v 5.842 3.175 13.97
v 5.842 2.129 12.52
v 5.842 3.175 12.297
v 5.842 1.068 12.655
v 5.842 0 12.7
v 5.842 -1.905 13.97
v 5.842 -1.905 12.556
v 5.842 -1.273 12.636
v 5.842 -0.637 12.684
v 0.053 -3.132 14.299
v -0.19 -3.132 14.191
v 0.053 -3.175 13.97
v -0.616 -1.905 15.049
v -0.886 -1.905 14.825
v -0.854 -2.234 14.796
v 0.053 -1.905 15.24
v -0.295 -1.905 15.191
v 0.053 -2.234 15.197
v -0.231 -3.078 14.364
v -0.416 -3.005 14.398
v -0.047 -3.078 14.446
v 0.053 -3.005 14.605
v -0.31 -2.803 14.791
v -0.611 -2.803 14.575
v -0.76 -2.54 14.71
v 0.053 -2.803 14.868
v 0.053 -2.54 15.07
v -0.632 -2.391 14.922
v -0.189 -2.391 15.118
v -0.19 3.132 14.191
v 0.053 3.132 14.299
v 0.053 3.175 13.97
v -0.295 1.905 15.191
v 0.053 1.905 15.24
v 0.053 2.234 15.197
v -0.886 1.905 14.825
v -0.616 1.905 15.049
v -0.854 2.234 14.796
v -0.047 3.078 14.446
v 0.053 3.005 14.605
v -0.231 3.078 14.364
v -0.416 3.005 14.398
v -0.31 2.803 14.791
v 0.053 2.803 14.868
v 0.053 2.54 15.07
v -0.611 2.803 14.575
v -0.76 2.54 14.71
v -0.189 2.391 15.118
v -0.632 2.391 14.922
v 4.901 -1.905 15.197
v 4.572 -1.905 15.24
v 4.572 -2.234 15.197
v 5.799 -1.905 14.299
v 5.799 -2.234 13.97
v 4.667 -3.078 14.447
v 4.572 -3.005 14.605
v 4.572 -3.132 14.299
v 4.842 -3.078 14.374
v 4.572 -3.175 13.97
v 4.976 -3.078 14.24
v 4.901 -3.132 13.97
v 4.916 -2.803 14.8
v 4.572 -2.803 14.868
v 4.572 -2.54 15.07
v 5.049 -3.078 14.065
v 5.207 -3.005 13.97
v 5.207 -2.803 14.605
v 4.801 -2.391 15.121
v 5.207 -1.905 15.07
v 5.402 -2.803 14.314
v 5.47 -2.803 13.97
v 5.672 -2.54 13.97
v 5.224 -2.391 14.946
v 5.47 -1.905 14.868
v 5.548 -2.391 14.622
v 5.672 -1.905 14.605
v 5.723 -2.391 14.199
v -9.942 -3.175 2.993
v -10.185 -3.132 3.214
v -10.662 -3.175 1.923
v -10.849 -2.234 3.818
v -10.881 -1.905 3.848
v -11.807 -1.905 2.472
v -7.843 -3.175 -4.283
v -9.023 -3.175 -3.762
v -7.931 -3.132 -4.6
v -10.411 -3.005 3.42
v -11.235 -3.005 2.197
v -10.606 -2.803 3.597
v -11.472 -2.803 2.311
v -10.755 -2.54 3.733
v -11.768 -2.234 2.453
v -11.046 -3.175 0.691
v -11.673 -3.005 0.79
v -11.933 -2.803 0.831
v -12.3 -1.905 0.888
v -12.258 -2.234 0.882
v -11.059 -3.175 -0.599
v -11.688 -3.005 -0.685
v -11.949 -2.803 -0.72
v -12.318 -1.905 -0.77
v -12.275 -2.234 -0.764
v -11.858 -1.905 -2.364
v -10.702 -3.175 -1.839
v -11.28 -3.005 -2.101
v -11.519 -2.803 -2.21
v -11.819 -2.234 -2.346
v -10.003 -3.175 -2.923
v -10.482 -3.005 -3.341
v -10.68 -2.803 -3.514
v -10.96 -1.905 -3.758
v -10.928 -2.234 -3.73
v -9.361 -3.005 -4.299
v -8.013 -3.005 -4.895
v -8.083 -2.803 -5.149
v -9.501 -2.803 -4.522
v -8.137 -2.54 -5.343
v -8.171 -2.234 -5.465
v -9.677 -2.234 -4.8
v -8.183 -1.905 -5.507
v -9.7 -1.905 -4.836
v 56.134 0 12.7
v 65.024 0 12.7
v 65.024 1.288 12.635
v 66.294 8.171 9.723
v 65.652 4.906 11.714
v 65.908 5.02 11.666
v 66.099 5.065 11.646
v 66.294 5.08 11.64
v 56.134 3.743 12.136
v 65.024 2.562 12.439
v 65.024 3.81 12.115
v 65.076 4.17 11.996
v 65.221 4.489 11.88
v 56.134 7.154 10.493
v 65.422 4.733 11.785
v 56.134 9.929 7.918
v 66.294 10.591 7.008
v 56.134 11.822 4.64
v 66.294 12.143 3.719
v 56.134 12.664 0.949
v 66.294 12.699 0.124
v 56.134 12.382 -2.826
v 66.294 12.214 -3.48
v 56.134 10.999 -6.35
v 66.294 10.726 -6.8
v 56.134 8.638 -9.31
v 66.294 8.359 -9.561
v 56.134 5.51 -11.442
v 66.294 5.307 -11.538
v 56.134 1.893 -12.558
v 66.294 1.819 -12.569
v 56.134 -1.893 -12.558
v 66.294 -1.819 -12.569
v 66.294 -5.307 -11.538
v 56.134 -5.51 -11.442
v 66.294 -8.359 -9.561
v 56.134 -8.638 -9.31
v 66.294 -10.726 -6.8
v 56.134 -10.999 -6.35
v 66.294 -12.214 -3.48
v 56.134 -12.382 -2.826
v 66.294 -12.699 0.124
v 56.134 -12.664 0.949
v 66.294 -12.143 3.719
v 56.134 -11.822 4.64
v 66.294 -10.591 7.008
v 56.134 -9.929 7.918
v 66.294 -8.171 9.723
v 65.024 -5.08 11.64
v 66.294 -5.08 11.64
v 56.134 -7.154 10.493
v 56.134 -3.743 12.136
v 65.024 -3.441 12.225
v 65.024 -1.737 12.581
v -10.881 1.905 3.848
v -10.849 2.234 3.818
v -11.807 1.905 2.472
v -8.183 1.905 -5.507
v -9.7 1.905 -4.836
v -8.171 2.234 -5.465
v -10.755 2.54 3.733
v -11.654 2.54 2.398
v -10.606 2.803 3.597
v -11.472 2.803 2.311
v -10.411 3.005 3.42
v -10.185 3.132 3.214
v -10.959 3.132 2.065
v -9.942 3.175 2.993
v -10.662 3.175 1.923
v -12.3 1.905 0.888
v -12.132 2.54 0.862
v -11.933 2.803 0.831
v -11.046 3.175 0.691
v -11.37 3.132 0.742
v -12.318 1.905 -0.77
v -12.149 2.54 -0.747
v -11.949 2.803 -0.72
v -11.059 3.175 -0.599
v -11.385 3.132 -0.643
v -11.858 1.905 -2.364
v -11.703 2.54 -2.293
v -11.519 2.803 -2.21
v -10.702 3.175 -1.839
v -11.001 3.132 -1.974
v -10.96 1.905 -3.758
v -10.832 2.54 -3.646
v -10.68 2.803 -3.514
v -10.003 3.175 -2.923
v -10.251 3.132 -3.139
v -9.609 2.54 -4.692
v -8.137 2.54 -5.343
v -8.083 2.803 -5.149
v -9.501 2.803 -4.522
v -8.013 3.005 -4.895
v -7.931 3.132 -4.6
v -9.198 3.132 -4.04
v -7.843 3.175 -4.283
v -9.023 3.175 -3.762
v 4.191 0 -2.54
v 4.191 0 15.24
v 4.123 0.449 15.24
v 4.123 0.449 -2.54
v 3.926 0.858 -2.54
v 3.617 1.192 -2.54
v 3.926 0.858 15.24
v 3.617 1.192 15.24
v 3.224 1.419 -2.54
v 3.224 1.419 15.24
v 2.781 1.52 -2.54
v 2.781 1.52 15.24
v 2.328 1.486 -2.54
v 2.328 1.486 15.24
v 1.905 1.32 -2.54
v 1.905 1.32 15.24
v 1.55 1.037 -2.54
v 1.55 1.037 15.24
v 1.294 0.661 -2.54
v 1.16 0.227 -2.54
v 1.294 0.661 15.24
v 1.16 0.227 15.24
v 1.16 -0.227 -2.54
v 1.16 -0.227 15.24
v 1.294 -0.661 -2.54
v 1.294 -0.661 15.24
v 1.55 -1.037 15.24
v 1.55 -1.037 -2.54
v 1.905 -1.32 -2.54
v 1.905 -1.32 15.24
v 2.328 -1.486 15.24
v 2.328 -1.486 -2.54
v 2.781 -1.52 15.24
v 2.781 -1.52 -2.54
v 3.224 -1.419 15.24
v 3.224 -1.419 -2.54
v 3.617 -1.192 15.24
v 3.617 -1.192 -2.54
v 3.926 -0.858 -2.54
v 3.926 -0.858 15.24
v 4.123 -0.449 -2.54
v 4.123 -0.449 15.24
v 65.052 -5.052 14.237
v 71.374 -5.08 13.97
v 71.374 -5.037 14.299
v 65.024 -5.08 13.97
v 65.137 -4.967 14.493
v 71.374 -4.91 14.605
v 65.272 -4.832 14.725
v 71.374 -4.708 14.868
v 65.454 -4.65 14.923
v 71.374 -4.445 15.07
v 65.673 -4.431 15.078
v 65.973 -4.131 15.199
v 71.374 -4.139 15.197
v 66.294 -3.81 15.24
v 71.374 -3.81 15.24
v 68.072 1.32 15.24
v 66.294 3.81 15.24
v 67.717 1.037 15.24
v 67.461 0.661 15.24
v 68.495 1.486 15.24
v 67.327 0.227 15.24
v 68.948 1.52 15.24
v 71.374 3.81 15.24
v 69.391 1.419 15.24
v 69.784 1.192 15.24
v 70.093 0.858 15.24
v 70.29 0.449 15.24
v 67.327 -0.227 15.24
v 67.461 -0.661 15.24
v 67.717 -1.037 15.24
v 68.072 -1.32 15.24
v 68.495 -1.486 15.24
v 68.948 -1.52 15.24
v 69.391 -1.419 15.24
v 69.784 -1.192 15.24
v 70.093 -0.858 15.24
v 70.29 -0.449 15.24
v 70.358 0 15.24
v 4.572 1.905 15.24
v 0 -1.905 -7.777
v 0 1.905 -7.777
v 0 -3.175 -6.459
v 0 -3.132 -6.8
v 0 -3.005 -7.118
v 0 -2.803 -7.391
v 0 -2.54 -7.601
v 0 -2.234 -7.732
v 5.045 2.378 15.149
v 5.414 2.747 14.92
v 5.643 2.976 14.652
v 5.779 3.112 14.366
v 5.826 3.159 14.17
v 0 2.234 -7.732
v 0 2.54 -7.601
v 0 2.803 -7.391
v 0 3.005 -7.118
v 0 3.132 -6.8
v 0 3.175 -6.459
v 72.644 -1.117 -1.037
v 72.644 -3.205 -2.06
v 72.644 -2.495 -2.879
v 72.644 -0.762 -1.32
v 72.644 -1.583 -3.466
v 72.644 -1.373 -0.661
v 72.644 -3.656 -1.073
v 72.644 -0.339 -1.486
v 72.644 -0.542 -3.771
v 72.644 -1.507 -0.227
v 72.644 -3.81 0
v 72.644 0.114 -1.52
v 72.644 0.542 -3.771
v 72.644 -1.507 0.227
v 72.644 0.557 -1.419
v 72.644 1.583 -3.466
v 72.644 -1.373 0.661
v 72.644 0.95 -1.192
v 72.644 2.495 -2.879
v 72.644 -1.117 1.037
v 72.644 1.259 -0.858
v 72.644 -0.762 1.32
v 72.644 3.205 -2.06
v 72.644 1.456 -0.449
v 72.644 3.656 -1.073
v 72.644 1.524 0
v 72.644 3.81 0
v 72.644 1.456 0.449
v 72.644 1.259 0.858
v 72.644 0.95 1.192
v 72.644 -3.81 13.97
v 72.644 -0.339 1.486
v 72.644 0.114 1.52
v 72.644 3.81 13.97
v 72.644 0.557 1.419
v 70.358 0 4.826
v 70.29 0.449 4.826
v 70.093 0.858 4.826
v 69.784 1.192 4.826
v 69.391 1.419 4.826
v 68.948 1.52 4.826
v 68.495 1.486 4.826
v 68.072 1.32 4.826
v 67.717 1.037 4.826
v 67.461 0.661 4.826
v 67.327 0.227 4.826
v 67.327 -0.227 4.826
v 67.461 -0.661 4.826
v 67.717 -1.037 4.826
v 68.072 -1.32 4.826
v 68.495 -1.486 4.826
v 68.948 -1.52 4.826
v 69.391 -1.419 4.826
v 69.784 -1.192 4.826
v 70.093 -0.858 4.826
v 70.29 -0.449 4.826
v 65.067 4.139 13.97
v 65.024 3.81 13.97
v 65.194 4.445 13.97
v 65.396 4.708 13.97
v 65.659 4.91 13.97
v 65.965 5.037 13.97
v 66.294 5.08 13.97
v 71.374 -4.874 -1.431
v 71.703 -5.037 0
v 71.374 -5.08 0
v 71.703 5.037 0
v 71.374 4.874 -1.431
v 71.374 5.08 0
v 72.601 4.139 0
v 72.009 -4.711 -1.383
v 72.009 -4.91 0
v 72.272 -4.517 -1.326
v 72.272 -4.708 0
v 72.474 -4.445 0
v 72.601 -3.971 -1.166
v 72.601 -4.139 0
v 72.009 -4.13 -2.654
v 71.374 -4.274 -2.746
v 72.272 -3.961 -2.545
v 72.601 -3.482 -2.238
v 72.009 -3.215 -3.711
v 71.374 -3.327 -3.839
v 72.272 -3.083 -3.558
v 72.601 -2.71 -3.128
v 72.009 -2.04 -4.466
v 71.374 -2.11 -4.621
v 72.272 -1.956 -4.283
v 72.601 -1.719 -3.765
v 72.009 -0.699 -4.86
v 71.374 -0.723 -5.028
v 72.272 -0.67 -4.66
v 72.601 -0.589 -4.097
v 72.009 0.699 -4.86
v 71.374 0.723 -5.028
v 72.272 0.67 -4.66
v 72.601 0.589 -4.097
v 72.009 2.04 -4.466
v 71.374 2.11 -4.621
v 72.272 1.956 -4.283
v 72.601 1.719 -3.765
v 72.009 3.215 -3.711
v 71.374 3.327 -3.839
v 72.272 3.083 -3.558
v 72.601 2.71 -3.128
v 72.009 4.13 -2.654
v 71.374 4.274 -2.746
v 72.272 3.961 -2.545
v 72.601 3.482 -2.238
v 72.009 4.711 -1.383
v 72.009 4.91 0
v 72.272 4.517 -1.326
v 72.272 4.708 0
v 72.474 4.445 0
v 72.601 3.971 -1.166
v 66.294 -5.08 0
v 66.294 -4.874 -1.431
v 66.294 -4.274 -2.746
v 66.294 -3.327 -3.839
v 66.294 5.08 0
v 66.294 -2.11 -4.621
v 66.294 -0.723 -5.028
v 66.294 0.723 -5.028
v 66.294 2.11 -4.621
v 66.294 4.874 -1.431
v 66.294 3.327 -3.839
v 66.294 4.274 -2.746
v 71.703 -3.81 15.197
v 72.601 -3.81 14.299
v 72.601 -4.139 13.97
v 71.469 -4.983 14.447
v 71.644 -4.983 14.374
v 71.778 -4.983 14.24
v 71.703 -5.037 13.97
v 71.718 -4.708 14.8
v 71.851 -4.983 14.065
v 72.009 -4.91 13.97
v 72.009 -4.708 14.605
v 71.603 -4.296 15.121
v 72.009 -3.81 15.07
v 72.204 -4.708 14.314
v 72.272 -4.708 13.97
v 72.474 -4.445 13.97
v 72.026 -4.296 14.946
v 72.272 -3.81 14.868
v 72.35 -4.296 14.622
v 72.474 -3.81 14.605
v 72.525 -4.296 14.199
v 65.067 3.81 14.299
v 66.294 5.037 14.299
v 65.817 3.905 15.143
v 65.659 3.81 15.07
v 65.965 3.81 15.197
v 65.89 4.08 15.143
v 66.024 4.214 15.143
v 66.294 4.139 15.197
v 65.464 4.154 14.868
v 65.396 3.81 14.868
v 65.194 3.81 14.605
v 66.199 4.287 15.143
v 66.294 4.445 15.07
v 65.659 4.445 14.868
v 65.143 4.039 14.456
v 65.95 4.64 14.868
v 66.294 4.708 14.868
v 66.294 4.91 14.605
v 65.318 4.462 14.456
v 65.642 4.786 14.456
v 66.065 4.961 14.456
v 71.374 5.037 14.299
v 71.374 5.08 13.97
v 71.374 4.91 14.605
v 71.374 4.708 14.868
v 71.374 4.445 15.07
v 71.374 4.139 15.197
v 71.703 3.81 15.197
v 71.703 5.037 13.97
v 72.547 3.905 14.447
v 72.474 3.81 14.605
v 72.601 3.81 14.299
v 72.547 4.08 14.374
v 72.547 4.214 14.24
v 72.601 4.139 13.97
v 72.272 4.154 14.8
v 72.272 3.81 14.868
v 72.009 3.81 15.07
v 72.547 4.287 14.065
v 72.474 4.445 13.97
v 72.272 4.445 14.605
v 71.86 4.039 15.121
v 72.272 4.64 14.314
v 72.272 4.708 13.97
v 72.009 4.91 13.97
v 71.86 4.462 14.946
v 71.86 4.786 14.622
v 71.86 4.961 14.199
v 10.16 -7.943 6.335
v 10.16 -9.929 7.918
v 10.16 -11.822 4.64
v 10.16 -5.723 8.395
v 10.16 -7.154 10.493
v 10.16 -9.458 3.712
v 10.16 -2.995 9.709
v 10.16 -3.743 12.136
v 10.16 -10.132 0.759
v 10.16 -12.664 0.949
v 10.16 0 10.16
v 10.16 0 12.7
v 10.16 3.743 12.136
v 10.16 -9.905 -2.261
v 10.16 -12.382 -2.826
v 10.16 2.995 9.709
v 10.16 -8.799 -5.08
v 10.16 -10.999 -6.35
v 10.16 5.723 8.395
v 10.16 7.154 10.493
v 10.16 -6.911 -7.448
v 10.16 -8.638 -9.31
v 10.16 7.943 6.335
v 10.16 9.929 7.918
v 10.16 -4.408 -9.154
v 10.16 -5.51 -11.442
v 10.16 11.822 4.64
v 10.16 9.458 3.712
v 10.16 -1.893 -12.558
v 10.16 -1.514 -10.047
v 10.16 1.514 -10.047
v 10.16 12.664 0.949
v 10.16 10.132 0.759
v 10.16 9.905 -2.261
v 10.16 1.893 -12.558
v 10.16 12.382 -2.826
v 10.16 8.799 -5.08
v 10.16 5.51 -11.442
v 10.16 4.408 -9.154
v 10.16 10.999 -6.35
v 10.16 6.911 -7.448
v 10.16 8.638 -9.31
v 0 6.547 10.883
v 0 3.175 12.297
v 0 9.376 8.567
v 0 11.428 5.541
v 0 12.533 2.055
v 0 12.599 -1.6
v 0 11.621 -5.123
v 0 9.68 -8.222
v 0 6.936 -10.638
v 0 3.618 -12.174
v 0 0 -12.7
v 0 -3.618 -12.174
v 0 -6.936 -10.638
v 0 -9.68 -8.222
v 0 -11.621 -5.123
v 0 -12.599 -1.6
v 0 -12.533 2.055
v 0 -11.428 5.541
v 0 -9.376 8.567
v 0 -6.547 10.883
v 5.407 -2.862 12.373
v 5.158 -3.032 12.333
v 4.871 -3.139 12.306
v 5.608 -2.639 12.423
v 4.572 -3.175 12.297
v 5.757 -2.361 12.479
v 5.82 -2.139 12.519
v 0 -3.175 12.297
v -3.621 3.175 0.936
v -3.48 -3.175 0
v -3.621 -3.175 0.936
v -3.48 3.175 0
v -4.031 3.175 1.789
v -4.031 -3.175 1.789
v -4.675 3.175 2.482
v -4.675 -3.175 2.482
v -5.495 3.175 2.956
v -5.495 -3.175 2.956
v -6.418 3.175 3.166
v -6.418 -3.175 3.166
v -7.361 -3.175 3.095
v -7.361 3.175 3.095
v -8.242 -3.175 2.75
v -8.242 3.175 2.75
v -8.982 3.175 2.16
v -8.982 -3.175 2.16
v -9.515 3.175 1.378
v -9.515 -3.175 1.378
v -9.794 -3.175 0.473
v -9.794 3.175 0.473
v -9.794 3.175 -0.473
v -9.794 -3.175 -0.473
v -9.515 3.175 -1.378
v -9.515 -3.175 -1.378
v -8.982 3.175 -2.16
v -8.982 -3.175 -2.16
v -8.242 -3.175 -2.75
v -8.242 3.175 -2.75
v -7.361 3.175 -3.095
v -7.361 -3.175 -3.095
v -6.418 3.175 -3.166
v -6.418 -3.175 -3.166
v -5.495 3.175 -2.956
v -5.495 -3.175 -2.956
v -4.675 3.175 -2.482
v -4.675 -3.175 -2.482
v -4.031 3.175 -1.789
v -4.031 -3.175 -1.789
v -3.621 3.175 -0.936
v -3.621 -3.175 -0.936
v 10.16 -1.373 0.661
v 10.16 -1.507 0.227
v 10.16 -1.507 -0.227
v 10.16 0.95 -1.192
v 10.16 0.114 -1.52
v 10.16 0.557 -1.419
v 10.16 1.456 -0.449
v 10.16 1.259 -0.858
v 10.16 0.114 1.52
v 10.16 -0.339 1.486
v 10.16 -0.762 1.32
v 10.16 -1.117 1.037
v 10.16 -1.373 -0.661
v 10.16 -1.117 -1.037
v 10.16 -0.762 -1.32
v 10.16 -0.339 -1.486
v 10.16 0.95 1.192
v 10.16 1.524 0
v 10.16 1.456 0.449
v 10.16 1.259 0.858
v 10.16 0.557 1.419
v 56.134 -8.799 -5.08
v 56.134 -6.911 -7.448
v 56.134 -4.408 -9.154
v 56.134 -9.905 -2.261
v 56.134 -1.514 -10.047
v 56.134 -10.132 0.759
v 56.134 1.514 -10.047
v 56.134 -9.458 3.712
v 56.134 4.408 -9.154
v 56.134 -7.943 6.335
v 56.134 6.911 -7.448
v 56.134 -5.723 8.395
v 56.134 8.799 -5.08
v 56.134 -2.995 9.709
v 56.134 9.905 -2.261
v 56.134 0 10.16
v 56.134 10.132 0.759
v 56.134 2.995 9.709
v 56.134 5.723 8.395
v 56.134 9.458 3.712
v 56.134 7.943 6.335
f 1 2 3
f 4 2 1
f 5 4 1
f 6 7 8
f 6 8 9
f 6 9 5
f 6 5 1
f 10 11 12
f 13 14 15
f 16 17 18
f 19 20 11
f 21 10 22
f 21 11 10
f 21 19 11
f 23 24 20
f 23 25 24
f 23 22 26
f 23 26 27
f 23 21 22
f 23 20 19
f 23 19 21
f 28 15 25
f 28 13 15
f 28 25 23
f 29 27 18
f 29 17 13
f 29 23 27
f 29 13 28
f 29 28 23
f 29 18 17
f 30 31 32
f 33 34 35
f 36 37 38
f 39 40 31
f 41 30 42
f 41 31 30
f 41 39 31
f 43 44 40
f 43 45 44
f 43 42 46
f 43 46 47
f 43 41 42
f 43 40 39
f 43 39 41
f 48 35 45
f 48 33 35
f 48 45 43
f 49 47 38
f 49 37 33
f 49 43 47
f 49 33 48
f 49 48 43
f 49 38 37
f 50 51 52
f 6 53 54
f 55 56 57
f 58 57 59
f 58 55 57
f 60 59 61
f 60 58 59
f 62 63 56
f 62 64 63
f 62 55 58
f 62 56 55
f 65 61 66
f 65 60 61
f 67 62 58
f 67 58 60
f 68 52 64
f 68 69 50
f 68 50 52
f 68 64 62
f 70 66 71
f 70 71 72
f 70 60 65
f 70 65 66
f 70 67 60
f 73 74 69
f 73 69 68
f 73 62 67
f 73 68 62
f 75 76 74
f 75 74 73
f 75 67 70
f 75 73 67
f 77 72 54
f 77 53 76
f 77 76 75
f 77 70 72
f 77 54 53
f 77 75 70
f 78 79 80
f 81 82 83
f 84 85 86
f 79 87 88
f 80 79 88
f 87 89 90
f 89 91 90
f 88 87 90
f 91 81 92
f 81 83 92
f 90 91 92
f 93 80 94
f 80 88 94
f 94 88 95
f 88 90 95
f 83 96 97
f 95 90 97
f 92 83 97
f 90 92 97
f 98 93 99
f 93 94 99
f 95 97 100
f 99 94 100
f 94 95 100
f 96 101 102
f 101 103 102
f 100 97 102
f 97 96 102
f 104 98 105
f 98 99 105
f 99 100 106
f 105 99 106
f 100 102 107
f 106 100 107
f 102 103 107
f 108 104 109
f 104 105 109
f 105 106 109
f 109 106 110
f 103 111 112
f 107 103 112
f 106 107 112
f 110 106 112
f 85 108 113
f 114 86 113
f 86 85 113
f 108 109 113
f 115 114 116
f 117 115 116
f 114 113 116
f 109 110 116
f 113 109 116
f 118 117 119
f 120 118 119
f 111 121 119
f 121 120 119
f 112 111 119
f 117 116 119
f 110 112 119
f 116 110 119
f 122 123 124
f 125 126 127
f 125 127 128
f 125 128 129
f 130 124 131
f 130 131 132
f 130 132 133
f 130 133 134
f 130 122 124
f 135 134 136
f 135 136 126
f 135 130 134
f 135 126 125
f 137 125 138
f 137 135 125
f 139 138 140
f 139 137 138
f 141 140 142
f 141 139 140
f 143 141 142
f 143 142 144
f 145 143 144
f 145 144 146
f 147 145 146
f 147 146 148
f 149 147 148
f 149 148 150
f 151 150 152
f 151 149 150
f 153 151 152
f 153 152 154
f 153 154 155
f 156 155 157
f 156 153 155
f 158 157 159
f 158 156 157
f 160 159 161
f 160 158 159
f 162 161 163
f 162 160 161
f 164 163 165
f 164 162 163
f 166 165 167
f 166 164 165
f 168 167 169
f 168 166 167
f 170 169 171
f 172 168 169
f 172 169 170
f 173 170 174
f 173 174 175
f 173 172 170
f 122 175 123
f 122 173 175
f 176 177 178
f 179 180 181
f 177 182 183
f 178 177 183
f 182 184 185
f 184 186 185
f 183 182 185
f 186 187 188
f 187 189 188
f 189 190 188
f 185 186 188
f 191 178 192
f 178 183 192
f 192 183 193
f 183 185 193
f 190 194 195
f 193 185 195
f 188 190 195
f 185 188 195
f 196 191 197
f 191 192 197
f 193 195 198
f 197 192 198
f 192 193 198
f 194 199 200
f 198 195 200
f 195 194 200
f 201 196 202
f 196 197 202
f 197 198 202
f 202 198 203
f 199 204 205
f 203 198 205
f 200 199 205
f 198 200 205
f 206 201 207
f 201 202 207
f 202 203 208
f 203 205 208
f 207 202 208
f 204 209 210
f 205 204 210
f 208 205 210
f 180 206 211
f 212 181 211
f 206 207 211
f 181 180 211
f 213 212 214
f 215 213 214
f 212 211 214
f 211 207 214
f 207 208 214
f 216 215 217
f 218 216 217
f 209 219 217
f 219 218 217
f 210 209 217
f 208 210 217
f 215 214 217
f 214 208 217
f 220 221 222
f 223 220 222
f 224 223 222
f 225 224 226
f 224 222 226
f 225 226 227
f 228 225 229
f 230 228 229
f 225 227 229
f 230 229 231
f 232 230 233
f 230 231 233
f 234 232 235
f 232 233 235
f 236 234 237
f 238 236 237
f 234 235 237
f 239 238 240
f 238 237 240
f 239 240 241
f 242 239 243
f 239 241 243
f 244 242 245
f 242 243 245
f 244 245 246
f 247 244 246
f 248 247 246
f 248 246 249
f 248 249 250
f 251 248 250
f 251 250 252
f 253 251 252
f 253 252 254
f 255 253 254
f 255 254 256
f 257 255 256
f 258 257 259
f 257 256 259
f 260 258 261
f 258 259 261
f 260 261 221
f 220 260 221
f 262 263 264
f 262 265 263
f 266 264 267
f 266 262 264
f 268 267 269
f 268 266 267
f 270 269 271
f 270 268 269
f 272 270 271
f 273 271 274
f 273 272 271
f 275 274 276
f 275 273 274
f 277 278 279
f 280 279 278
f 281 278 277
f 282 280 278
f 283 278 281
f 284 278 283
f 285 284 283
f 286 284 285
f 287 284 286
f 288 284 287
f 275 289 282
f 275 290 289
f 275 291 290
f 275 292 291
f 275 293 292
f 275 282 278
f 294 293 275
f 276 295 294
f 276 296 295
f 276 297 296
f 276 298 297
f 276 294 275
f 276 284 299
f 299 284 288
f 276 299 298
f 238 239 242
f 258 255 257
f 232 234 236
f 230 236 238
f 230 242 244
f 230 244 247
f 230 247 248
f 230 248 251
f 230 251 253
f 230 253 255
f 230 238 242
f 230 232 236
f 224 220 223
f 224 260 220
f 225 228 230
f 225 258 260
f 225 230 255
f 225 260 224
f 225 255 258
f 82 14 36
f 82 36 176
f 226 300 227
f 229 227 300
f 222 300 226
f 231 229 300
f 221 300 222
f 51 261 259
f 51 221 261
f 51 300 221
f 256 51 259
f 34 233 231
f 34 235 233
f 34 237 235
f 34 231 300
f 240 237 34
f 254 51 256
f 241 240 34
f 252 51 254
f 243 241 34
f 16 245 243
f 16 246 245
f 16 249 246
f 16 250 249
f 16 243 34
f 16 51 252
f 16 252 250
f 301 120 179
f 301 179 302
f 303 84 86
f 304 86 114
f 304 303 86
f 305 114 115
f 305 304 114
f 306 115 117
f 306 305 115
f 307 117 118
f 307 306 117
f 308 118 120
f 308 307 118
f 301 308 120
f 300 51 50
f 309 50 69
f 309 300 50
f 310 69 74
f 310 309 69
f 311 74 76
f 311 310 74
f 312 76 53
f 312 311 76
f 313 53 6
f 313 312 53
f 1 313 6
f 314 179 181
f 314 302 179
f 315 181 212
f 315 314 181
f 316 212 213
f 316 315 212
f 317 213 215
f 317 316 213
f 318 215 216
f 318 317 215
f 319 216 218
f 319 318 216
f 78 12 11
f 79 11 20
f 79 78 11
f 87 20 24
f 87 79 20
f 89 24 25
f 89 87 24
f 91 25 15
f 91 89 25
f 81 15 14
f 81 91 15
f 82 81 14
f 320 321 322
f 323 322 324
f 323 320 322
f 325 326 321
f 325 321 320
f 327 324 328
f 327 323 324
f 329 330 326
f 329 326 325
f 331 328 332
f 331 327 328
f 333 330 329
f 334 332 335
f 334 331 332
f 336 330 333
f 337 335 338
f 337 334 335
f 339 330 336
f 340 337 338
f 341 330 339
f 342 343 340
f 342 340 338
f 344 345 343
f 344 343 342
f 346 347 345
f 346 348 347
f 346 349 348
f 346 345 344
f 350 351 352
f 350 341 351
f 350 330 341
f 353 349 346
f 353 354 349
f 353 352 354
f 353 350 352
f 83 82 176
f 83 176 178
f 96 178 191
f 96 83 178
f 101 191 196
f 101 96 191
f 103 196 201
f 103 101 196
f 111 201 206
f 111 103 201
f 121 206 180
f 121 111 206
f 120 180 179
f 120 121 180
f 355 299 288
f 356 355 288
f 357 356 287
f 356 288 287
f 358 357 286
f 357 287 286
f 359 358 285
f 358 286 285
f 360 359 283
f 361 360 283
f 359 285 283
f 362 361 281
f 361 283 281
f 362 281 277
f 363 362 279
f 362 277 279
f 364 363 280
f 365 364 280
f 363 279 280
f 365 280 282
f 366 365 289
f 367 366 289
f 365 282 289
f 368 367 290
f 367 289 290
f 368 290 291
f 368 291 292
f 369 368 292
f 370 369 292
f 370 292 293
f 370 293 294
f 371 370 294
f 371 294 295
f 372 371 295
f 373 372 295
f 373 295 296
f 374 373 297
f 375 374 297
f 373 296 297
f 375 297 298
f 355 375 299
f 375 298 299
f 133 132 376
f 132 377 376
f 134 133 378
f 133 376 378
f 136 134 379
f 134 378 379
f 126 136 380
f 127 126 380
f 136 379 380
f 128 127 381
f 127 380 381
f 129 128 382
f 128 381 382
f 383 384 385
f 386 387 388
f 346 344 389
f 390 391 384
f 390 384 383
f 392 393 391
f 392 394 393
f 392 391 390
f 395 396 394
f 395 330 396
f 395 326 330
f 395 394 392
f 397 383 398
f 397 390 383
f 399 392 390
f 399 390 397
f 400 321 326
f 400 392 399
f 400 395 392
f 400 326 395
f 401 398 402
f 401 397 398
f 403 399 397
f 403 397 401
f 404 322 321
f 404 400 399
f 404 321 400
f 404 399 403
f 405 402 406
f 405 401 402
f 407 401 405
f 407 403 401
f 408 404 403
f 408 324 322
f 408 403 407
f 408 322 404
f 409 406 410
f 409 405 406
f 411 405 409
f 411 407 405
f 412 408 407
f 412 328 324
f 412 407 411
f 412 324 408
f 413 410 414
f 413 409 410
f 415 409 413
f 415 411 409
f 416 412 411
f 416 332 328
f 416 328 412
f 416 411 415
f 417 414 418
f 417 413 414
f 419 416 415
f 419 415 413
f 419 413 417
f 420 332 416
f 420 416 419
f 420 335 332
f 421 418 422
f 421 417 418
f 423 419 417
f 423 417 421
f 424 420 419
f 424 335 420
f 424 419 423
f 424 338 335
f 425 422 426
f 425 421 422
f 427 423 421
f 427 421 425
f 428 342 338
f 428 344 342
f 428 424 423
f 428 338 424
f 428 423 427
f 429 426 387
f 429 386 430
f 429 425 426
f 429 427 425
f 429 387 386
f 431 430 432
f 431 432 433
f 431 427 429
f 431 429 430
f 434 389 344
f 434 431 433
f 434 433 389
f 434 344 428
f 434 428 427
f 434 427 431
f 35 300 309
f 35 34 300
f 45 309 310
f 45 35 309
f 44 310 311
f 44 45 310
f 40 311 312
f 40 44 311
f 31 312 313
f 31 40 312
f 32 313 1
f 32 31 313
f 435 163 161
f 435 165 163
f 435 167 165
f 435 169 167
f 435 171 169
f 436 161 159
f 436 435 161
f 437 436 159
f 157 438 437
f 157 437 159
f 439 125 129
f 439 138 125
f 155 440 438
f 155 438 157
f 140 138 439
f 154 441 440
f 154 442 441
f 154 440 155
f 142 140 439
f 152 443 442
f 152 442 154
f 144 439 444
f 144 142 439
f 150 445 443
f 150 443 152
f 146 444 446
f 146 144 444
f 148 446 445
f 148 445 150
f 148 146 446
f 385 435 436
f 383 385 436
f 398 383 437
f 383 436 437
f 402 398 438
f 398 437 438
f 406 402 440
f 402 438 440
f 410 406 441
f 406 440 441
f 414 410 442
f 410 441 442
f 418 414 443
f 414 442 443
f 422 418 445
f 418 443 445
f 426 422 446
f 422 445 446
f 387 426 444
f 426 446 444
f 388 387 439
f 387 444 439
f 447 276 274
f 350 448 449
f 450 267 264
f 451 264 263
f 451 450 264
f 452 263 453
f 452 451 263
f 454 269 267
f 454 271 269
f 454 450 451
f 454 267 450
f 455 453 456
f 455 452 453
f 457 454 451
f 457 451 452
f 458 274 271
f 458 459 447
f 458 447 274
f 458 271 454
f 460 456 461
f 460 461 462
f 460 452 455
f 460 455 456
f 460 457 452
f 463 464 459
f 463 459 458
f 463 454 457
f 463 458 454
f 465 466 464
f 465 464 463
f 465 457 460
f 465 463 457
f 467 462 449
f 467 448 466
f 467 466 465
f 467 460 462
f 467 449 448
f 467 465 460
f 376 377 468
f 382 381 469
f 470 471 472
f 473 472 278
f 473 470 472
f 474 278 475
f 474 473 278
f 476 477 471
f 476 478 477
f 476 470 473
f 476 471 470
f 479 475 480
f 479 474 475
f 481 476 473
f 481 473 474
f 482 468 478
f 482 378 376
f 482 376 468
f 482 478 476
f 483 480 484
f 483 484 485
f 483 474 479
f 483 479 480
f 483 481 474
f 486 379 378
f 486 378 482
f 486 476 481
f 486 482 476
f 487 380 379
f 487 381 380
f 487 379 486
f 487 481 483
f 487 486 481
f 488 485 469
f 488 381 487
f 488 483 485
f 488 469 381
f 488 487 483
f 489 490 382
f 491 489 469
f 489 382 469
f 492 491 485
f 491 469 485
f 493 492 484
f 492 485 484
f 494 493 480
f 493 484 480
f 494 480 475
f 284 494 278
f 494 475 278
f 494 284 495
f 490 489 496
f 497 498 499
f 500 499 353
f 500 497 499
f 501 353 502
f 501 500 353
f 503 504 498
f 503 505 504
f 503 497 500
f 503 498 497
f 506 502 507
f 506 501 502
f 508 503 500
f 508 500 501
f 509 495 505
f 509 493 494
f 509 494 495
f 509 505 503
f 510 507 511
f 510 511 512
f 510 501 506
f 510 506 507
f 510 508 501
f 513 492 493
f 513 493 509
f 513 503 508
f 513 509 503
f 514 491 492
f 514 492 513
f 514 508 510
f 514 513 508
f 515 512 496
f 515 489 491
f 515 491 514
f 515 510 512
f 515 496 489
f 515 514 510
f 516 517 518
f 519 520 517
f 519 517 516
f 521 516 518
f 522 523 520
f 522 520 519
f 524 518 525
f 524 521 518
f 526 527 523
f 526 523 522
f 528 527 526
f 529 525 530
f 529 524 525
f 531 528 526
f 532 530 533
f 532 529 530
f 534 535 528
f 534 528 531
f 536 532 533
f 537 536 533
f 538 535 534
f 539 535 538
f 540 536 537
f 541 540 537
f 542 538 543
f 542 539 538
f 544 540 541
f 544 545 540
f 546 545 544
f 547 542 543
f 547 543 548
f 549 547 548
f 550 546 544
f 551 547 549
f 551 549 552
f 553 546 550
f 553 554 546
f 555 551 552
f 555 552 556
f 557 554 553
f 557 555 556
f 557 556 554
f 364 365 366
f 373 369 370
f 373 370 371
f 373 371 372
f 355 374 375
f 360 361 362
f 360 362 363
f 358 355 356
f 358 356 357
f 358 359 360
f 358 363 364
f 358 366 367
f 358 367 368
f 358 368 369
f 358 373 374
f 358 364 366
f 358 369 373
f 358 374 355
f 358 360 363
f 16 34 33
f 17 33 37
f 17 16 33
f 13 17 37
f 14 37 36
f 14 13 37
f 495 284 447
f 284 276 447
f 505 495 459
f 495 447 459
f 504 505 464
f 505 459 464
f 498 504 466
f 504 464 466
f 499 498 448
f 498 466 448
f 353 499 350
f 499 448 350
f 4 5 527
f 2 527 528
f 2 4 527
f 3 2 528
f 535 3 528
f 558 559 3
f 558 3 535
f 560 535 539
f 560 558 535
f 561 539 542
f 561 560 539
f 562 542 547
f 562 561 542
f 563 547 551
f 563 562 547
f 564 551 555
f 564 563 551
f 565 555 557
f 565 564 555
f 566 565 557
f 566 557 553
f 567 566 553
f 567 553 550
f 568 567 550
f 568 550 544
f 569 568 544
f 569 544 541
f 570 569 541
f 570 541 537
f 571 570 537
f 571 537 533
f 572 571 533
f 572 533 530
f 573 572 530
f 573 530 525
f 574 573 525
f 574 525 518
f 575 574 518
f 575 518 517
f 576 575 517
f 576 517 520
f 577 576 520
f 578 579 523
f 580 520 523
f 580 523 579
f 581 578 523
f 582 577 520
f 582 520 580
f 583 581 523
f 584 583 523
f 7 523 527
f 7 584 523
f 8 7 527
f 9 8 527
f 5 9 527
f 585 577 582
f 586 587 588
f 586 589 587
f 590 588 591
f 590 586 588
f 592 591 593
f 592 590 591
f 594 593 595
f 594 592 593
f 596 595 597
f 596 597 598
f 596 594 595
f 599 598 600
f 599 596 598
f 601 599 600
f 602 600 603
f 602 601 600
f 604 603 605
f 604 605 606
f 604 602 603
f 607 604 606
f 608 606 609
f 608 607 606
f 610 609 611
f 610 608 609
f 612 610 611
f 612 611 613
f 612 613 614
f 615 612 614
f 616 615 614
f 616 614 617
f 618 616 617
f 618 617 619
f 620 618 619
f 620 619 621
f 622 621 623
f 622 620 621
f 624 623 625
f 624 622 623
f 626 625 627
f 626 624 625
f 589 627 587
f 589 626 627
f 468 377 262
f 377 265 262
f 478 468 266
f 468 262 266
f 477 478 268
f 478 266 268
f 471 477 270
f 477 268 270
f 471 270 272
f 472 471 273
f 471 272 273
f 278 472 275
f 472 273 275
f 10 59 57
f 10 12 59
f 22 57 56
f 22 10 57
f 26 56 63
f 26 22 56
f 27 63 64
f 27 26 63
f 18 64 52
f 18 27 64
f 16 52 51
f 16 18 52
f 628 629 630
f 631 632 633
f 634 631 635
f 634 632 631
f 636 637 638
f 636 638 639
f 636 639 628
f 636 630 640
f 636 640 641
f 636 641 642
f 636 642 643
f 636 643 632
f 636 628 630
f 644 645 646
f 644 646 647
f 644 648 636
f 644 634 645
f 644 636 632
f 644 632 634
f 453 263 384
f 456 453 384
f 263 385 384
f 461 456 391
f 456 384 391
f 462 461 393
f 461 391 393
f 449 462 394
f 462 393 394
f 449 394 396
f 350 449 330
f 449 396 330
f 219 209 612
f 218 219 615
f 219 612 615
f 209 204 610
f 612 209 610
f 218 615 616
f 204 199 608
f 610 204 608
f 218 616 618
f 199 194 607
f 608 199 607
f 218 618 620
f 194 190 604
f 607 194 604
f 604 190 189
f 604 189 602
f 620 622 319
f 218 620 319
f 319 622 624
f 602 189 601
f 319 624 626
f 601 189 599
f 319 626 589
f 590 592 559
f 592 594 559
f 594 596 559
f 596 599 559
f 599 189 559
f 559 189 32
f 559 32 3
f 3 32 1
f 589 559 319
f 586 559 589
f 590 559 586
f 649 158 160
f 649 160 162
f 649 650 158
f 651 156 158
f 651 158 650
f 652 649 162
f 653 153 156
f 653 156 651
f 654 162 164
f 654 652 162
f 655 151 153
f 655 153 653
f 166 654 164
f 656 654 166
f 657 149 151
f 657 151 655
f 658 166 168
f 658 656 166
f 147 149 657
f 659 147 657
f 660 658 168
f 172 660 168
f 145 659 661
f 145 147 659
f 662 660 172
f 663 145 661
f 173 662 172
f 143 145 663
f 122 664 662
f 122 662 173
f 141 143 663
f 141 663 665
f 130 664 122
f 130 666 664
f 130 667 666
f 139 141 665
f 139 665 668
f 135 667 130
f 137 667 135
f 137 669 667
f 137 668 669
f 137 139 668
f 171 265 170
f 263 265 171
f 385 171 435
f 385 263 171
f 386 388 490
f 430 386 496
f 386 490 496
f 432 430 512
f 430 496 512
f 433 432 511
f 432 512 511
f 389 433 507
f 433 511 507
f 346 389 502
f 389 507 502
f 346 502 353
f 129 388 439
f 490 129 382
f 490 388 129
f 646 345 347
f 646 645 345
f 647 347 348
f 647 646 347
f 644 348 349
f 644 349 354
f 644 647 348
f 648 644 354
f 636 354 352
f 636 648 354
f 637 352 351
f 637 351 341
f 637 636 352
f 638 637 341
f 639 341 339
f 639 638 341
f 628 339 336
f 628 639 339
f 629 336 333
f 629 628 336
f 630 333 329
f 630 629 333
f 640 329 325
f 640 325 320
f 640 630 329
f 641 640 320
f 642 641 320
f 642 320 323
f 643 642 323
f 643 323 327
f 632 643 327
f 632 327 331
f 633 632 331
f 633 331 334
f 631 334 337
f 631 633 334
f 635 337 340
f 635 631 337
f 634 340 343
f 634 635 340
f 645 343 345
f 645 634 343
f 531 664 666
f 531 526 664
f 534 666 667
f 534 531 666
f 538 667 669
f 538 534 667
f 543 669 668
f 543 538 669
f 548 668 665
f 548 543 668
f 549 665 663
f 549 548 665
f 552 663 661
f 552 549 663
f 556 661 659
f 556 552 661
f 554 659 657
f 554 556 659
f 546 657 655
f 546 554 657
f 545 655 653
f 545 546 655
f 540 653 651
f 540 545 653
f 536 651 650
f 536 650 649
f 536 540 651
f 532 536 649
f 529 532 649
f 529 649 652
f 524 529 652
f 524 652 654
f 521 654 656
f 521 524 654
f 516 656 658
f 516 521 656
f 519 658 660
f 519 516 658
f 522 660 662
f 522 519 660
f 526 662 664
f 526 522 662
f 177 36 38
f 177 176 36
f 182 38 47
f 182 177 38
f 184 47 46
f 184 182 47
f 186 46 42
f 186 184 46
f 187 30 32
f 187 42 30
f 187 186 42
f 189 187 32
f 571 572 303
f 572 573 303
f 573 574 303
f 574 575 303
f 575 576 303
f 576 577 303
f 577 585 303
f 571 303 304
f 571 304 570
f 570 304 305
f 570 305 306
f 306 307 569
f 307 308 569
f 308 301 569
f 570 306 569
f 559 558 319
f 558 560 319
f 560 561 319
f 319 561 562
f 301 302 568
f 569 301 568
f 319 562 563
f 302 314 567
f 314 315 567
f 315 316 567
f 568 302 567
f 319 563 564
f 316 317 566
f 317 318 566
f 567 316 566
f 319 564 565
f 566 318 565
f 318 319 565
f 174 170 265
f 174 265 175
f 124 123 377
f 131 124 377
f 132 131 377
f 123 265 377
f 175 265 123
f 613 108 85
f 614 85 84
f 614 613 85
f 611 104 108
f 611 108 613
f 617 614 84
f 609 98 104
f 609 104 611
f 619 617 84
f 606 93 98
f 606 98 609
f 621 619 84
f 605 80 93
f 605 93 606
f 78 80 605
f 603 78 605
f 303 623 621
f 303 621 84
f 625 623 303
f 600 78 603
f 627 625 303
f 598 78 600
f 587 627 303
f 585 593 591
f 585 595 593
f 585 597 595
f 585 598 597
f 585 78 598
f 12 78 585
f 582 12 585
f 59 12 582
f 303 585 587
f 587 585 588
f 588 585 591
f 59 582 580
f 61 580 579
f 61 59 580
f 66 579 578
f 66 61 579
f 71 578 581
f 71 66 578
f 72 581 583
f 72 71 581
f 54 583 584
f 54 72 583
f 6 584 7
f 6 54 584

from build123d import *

# Parameters (mm, degrees)
F0_W          = 5.842
F0_H          = 12.7
F0_R          = 3.175
F2_DEPTH      = 3.175
F3_R          = 1.524
F4_DEPTH      = 6.35
F4_DEPTH_BACK = 1.27
F6_R          = 1.524
F7_DEPTH      = 17.78
F5_R          = 1.524
F8_DEPTH      = 10.414
F9_DEPTH      = 56.134
F10_R         = 1.27


with BuildPart() as f1:
    # F0 (on Front) → F1 (revolve)
    with BuildSketch(Plane.XZ):
        Polygon((5.842, 12.7), (5.842, 0), (66.294, 0), (66.294, 12.7), (56.134, 12.7), (56.134, 10.16), (10.16, 10.16), (10.16, 12.7), align=None)
        with Locations((2.921, 6.35)):
            Rectangle(F0_W, F0_H)
    revolve(axis=Axis((33.147, 0, 0), (-1, 0, 0)))

    # F0 (on Front) → F2 (join, symmetric)
    with BuildSketch(Plane.XZ):
        with Locations((2.921, 6.35)):
            Rectangle(F0_W, F0_H)
        with BuildLine():
            Line((-0.9398, 0), (0, 0))
            Line((0, 0), (0, 12.7))
            Line((0, 12.7), (5.842, 12.7))
            Line((5.842, 12.7), (5.842, 15.24))
            Line((5.842, 15.24), (-0.508, 15.24))
            Line((-0.508, 15.24), (-10.88063, 3.847543))
            ThreePointArc((-10.88063, 3.847543), (-4.591961, 5.329721), (-0.9398, 0))
        make_face()
        with BuildLine():
            ThreePointArc((-8.182663, -5.506983), (-3.195791, -4.549339), (-0.9398, 0))
            ThreePointArc((-0.9398, 0), (-4.591961, 5.329721), (-10.88063, 3.847543))
            ThreePointArc((-10.88063, 3.847543), (-12.145978, -1.583727), (-8.182663, -5.506983))
        make_face()
        with Locations((-6.6548, 0)):
            Circle(F0_R, mode=Mode.SUBTRACT)
        with BuildLine():
            Line((5.842, 0), (0, 0))
            Line((0, 0), (-0.9398, 0))
            ThreePointArc((-0.9398, 0), (-3.195791, -4.549339), (-8.182663, -5.506983))
            Line((-8.182663, -5.506983), (5.842, -9.398))
            Line((5.842, -9.398), (5.842, 0))
        make_face()
    extrude(amount=F2_DEPTH, both=True)

    # F3 (on face) → F4 (join, two sides)
    with BuildSketch(Plane.YZ.offset(66.294)) as f4_sk:
        with BuildLine():
            ThreePointArc((-5.08, 0), (0, -5.08), (5.08, 0))
            ThreePointArc((5.08, 0), (0, 5.08), (-5.08, 0))
        make_face()
        Circle(F3_R, mode=Mode.SUBTRACT)
        with BuildLine():
            ThreePointArc((-5.08, 0), (0, 5.08), (5.08, 0))
            Line((5.08, 0), (5.08, 15.24))
            Line((5.08, 15.24), (-5.08, 15.24))
            Line((-5.08, 15.24), (-5.08, 0))
        make_face()
    extrude(amount=F4_DEPTH)
    extrude(f4_sk.sketch, amount=-F4_DEPTH_BACK)

    # F6 (on face) → F7 (cut)
    with BuildSketch(Plane.XY.offset(15.24)):
        with Locations((2.667, 0)):
            Circle(F6_R)
    extrude(amount=-F7_DEPTH, mode=Mode.SUBTRACT)

    # F5 (on face) → F8 (cut)
    with BuildSketch(Plane.XY.offset(15.24)):
        with Locations((68.834, 0)):
            Circle(F5_R)
    extrude(amount=-F8_DEPTH, mode=Mode.SUBTRACT)

    # F3 (on face) → F9 (cut, through all)
    with BuildSketch(Plane.YZ.offset(66.294)):
        Circle(F3_R)
    extrude(amount=-F9_DEPTH, mode=Mode.SUBTRACT)

    # F10
    f10_edges = [f1.edges().sort_by_distance(p)[0] for p in [
        (65.024, 5.08, 13.439871),
        (65.024, 0, 15.24),
        (68.834, 5.08, 15.24),
        (72.644, 0, 15.24),
        (68.834, -5.08, 15.24),
        (72.644, 5.08, 7.62),
        (72.644, -5.08, 7.62),
        (2.667, 3.175, 15.24),
        (-5.694315, 3.175, 9.543772),
        (5.842, 0, 15.24),
        (2.667, -3.175, 15.24),
        (5.842, -3.175, 13.768361),
        (-0.508, 0, 15.24),
        (-5.694315, -3.175, 9.543772),
    ]]
    fillet(f10_edges, radius=F10_R)


solid = f1.part
